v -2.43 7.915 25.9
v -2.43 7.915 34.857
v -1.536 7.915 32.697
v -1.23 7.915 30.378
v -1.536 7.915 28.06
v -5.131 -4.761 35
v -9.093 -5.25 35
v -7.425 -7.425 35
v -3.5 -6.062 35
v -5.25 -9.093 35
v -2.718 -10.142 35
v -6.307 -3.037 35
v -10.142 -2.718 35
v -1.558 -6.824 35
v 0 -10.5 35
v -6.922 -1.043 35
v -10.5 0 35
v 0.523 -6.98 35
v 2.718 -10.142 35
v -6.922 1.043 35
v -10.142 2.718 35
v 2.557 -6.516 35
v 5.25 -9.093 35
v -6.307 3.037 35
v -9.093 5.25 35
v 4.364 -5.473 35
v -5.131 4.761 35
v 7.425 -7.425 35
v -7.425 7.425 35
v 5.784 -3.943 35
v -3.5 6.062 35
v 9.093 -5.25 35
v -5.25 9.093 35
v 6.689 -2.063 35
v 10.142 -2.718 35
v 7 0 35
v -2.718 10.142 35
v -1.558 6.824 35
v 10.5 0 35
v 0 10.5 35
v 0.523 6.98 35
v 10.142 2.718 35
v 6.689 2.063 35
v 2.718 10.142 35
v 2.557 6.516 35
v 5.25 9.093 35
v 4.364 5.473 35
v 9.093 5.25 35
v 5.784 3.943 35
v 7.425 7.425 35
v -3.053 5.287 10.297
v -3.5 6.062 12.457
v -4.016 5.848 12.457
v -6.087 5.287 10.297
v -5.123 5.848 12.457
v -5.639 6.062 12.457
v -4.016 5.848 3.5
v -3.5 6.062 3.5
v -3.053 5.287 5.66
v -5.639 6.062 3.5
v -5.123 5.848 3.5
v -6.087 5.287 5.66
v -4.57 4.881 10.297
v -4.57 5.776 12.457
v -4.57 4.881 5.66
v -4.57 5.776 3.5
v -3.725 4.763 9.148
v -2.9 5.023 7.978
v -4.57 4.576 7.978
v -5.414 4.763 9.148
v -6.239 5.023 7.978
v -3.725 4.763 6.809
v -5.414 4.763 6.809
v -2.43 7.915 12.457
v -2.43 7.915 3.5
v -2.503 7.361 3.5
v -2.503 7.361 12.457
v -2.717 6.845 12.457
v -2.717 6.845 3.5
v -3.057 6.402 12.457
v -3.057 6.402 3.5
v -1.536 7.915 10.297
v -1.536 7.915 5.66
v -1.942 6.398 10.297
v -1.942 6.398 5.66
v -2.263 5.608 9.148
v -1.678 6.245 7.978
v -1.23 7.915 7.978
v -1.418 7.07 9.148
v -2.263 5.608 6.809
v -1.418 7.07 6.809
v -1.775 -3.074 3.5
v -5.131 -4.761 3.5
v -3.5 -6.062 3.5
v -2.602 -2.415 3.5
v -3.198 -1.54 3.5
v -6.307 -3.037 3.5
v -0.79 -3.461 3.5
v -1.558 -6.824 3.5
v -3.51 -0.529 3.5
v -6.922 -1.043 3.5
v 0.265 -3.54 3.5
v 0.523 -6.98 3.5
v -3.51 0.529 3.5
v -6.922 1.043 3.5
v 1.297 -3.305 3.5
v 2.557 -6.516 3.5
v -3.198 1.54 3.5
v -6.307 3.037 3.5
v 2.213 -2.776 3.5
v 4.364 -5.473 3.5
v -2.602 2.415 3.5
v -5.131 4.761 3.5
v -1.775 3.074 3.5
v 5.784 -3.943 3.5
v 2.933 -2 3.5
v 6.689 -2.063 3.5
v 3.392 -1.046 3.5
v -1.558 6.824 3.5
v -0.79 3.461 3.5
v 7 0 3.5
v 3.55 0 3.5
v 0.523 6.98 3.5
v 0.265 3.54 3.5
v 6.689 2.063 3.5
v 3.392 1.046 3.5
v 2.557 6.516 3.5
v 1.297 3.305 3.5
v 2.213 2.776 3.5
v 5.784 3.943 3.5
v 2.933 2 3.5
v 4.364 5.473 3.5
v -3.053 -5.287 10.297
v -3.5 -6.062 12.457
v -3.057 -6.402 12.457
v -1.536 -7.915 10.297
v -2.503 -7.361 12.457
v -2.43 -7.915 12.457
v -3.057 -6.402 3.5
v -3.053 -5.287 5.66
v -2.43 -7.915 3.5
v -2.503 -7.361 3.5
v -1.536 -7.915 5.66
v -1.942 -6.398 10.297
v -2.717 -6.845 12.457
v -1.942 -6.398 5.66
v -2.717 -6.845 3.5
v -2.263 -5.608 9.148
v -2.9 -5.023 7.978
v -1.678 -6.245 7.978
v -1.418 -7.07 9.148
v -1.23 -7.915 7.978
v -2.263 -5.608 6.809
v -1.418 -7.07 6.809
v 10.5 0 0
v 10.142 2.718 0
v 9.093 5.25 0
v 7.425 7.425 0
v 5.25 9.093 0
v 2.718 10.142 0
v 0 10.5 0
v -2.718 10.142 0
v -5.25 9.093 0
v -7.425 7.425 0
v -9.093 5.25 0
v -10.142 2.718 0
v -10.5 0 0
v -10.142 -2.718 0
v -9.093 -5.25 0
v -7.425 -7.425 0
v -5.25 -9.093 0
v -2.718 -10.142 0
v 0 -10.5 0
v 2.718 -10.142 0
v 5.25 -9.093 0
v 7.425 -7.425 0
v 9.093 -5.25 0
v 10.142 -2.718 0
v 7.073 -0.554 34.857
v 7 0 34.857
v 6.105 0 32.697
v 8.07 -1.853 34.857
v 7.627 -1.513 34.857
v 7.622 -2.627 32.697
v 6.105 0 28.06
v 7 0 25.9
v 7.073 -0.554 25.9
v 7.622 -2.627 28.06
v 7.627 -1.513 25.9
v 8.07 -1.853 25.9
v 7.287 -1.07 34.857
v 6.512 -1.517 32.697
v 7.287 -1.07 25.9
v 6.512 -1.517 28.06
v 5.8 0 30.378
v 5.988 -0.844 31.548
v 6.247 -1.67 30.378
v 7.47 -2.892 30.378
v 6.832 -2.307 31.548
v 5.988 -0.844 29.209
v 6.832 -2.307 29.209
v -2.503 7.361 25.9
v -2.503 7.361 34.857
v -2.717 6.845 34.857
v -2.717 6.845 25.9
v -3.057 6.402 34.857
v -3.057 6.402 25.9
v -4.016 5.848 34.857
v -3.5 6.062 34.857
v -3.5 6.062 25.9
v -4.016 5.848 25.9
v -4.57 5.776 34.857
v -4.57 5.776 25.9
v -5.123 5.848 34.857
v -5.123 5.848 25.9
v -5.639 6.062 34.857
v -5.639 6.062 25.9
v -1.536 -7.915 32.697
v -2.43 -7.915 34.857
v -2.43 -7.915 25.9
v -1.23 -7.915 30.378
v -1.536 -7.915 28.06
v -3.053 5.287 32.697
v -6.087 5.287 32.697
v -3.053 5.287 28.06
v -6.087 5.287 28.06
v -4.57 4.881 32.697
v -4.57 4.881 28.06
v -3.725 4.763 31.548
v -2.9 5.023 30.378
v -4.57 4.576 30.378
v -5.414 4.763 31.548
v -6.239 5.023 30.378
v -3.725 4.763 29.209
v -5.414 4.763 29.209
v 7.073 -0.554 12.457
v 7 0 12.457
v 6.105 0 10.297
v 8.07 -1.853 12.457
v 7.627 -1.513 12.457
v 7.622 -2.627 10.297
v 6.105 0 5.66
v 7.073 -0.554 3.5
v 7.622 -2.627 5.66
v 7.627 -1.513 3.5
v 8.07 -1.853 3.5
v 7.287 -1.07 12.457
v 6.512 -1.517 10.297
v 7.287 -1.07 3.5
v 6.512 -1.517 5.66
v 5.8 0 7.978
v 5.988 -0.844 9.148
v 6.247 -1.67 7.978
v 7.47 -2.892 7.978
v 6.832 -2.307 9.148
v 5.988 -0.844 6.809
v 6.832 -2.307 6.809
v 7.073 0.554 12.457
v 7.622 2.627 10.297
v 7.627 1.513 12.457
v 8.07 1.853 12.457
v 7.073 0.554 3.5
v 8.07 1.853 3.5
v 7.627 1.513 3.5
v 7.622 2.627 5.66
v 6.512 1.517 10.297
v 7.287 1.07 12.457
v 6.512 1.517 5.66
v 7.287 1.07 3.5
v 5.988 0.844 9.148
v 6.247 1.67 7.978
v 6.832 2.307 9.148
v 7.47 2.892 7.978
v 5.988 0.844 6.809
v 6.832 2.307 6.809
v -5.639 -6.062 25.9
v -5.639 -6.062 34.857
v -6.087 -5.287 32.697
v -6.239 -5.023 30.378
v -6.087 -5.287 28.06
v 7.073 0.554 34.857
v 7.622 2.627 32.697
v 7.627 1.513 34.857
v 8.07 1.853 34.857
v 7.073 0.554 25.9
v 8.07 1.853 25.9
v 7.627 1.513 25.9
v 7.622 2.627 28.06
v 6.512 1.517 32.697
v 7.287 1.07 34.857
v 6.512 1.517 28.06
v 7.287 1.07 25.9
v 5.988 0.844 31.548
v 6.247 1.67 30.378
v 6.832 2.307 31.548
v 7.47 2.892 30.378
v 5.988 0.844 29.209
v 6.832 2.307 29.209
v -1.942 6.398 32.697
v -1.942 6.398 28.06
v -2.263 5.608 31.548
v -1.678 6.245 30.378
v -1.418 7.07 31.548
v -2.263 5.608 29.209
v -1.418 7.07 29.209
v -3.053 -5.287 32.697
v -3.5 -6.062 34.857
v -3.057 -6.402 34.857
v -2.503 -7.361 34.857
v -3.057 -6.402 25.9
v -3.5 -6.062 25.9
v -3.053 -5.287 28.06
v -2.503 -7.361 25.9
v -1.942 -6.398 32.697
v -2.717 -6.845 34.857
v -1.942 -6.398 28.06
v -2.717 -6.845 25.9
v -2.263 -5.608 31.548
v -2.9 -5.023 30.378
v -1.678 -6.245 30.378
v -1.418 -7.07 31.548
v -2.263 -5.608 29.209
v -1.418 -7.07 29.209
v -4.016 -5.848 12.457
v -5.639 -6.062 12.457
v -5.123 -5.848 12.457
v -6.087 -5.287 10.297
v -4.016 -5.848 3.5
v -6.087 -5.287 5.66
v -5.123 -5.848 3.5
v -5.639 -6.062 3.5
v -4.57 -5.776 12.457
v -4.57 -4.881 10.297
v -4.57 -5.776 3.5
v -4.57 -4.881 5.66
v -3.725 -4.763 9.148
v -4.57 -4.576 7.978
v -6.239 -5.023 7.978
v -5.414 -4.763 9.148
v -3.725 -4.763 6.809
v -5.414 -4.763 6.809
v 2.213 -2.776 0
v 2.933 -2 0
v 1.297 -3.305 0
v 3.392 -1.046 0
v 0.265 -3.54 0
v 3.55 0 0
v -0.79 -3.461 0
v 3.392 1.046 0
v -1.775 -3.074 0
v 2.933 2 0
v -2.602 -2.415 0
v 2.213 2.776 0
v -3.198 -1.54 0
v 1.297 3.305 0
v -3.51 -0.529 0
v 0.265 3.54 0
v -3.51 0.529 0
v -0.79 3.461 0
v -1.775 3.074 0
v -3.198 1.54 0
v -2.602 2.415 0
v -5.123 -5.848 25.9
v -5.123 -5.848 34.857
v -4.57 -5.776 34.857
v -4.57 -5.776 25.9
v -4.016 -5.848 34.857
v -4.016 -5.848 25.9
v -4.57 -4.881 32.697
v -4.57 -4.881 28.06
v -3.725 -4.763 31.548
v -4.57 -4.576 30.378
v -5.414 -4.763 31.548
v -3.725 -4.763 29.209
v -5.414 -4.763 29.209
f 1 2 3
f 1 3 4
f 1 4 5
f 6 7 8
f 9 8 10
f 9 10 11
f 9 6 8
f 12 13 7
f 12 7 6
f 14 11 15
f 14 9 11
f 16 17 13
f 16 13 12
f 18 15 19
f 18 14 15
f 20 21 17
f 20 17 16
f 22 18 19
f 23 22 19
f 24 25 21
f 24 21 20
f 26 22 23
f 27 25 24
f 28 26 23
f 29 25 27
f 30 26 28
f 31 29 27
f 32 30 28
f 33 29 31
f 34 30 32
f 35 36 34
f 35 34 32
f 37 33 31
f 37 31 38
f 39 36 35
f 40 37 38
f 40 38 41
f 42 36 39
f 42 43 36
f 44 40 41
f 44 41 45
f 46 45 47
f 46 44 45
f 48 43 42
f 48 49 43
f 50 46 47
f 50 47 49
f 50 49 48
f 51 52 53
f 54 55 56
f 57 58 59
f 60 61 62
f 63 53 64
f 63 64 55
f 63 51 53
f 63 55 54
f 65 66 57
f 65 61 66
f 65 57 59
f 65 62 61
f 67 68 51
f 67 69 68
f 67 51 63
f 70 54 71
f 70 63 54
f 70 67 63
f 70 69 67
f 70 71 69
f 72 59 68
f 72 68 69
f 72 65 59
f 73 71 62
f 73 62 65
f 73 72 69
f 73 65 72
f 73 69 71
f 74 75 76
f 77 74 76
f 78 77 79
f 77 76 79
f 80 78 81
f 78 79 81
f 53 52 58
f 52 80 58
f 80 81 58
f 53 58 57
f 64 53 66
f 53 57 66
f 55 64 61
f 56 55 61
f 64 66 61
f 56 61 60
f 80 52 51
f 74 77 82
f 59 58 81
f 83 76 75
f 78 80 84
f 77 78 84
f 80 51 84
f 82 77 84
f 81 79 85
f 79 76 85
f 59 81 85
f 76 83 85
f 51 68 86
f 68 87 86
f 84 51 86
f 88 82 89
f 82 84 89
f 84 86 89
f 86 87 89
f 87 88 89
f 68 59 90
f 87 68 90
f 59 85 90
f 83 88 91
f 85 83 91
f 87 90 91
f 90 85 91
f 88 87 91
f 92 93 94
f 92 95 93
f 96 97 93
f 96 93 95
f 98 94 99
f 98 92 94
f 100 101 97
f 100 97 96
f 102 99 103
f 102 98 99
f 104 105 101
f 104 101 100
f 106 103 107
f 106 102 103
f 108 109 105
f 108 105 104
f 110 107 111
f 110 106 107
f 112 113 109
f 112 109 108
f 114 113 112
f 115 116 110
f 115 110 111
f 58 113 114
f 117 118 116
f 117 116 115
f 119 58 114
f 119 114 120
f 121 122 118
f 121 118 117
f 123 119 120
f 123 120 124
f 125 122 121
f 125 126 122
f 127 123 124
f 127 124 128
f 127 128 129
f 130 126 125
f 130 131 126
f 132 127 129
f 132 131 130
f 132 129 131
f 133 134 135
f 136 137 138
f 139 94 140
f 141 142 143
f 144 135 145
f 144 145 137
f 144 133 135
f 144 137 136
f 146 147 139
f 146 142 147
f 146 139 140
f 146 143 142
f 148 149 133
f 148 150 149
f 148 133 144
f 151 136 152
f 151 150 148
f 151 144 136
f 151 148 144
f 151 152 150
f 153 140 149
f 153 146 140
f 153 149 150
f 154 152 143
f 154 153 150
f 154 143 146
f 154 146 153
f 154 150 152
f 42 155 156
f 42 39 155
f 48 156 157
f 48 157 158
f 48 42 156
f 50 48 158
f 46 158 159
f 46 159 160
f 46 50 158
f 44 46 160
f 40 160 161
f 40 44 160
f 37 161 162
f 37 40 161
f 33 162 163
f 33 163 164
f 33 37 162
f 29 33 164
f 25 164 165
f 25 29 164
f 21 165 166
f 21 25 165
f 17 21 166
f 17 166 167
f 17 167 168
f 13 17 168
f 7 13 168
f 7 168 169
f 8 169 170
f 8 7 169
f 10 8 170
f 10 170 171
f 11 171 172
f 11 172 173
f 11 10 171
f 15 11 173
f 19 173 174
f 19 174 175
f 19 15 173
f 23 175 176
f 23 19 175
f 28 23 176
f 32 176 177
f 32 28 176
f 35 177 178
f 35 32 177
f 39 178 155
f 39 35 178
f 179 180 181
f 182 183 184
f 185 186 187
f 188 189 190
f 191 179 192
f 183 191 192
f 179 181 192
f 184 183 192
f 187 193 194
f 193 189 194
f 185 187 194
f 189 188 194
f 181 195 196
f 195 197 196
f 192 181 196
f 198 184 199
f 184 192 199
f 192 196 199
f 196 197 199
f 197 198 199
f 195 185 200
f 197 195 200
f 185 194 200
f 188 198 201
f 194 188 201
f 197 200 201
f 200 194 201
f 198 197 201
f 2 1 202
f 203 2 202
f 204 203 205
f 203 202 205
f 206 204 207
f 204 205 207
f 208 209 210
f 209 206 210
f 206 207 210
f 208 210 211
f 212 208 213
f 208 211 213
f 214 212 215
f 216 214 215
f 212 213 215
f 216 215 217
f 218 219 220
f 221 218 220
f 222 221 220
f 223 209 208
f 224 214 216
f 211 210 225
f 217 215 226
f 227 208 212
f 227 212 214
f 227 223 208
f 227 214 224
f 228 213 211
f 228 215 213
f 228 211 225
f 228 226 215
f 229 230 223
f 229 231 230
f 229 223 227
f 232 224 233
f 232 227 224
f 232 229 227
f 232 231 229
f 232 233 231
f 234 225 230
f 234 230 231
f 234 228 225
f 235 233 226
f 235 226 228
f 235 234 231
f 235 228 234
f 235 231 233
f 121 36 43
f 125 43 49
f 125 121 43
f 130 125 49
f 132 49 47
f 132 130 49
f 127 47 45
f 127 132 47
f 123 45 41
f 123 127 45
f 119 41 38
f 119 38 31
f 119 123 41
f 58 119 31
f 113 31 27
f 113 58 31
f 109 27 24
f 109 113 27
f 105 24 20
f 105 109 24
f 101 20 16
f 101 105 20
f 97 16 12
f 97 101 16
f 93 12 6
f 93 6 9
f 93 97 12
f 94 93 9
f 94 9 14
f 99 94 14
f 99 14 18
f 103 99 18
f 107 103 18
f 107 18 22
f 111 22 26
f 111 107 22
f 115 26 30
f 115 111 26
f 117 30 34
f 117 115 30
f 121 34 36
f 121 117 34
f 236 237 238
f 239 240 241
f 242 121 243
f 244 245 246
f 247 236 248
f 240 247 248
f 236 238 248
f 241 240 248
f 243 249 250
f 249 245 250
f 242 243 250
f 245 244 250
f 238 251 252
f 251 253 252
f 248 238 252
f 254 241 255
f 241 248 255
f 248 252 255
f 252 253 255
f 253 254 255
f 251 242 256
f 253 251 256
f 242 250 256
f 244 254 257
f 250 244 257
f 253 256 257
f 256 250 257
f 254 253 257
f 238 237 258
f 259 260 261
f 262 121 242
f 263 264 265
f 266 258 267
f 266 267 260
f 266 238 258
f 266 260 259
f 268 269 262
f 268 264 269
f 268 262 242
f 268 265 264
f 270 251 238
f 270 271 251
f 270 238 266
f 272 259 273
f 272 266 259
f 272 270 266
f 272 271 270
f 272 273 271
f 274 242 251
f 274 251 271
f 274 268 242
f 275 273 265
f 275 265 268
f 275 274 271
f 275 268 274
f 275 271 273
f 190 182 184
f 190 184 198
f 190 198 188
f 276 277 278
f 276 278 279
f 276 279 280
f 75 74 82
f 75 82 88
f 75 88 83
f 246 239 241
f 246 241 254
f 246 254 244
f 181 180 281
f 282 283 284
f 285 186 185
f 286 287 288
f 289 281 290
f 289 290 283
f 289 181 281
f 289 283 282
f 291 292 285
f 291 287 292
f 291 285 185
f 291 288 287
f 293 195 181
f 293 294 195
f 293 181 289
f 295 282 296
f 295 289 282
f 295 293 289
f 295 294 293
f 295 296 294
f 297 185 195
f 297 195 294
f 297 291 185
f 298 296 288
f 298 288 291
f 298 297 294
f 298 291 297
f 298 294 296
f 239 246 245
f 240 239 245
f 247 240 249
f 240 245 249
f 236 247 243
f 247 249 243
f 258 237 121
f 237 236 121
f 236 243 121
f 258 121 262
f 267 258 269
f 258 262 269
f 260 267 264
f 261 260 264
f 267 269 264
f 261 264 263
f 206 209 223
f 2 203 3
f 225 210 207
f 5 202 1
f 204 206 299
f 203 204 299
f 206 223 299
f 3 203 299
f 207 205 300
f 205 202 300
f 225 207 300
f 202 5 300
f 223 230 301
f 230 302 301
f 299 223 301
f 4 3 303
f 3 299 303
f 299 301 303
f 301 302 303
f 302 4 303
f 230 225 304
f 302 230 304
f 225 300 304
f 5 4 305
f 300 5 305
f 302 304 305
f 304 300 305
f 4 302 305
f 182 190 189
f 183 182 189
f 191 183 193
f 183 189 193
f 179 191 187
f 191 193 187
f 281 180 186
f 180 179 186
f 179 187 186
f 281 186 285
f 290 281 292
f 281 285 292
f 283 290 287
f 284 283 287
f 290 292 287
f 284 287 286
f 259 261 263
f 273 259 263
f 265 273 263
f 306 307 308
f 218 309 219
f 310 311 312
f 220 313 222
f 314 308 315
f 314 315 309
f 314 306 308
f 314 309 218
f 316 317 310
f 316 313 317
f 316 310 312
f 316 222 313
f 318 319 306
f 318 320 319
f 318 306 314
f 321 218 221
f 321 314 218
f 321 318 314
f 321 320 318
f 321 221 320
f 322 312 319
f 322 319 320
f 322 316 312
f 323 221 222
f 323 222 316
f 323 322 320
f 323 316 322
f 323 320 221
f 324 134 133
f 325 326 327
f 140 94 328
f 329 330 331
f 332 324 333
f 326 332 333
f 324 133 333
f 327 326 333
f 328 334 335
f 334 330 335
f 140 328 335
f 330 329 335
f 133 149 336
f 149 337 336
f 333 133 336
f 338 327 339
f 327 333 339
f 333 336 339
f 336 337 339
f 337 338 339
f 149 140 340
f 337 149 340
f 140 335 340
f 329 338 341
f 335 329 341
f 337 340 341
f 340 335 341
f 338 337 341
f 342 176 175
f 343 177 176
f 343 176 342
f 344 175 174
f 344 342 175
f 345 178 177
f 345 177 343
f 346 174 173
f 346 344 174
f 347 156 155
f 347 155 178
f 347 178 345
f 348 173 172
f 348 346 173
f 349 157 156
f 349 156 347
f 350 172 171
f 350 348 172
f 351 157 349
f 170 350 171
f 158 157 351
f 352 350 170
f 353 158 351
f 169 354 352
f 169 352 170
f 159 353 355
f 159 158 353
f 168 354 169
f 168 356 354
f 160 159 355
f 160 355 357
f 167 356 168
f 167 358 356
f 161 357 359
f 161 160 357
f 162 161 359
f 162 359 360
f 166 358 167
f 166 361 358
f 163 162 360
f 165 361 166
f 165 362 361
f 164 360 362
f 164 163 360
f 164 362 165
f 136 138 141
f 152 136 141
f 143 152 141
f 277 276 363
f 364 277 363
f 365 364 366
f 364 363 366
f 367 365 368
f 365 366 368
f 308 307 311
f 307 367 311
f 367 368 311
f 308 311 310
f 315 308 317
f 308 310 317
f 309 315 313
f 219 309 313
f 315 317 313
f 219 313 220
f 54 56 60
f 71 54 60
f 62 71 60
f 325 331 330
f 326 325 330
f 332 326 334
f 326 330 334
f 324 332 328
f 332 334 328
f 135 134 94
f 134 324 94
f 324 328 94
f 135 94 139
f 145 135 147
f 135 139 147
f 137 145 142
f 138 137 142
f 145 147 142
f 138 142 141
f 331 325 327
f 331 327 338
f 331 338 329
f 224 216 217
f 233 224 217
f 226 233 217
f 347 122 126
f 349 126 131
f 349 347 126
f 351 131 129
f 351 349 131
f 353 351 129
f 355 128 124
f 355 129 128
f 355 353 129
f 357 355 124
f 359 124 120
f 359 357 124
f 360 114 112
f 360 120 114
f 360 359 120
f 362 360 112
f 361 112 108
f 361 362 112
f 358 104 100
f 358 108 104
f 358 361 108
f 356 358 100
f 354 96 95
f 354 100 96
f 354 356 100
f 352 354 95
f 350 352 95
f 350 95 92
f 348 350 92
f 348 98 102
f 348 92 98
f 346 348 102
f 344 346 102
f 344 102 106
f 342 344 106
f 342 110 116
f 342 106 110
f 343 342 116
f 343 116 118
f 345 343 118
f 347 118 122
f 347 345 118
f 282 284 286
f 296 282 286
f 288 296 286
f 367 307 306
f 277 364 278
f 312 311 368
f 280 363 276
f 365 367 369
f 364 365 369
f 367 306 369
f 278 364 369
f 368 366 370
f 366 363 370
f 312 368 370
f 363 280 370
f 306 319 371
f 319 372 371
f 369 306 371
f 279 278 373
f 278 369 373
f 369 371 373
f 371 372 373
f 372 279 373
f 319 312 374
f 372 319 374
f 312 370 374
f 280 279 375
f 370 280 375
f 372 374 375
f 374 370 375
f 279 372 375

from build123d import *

# Parameters (mm, degrees)
SKETCH004_R             = 3.55
HOLE_DEPTH              = 35.001
REVOLUTION001_ANGLE     = 120
REVOLUTION002_ANGLE     = 120
BODY002_PLACEMENT_ANGLE = 120
REVOLUTION003_ANGLE     = 120
BODY003_PLACEMENT_ANGLE = 240
REVOLUTION004_ANGLE     = 120
REVOLUTION005_ANGLE     = 120
BODY005_PLACEMENT_ANGLE = 120
REVOLUTION006_ANGLE     = 120
BODY006_PLACEMENT_ANGLE = 240


with BuildPart() as sleeve:
    # Sketch → Revolution (revolve)
    with BuildSketch(Plane.XZ):
        Polygon((0, 0), (10.5, 0), (10.5, 35), (7, 35), (7, 3.5), (0, 3.5), align=None)
    revolve(axis=Axis((0, 0, 0), (0, 0, 1)))

    # Sketch004 → Hole (cut, through all)
    with BuildSketch(Plane.XY):
        Circle(SKETCH004_R)
    extrude(amount=HOLE_DEPTH, mode=Mode.SUBTRACT)


with BuildPart() as body001:
    # Sketch003 → Revolution001 (revolve, symmetric)
    with BuildSketch(Plane.XZ) as revolution001_sk:
        with BuildLine():
            ThreePointArc((7, 12.456922), (5.8, 7.978461), (7, 3.5))
            Line((7, 12.456922), (7, 3.5))
        make_face()
    revolve(axis=Axis((9.13913, 0, 0), (0, 0, 1)), revolution_arc=REVOLUTION001_ANGLE / 2)
    revolve(revolution001_sk.sketch, axis=Axis((9.13913, 0, 0), (0, 0, -1)), revolution_arc=REVOLUTION001_ANGLE / 2)


with BuildPart() as body002:
    # Sketch003 → Revolution002 (revolve, symmetric)
    with BuildSketch(Plane.XZ) as revolution002_sk:
        with BuildLine():
            ThreePointArc((7, 12.456922), (5.8, 7.978461), (7, 3.5))
            Line((7, 12.456922), (7, 3.5))
        make_face()
    revolve(axis=Axis((9.13913, 0, 0), (0, 0, 1)), revolution_arc=REVOLUTION002_ANGLE / 2)
    revolve(revolution002_sk.sketch, axis=Axis((9.13913, 0, 0), (0, 0, -1)), revolution_arc=REVOLUTION002_ANGLE / 2)


with BuildPart() as body002_1:
    # Body002 placement: moved
    add(body002.part.rotate(Axis((0, 0, 0), (0, 0, 1)), BODY002_PLACEMENT_ANGLE))


with BuildPart() as body003:
    # Sketch003 → Revolution003 (revolve, symmetric)
    with BuildSketch(Plane.XZ) as revolution003_sk:
        with BuildLine():
            ThreePointArc((7, 12.456922), (5.8, 7.978461), (7, 3.5))
            Line((7, 12.456922), (7, 3.5))
        make_face()
    revolve(axis=Axis((9.13913, 0, 0), (0, 0, 1)), revolution_arc=REVOLUTION003_ANGLE / 2)
    revolve(revolution003_sk.sketch, axis=Axis((9.13913, 0, 0), (0, 0, -1)), revolution_arc=REVOLUTION003_ANGLE / 2)


with BuildPart() as body003_1:
    # Body003 placement: moved
    add(body003.part.rotate(Axis((0, 0, 0), (0, 0, 1)), BODY003_PLACEMENT_ANGLE))


with BuildPart() as body004:
    # Sketch003 → Revolution004 (revolve, symmetric)
    with BuildSketch(Plane.XZ) as revolution004_sk:
        with BuildLine():
            ThreePointArc((7, 12.456922), (5.8, 7.978461), (7, 3.5))
            Line((7, 12.456922), (7, 3.5))
        make_face()
    revolve(axis=Axis((9.13913, 0, 0), (0, 0, 1)), revolution_arc=REVOLUTION004_ANGLE / 2)
    revolve(revolution004_sk.sketch, axis=Axis((9.13913, 0, 0), (0, 0, -1)), revolution_arc=REVOLUTION004_ANGLE / 2)


with BuildPart() as body004_1:
    # Body004 placement: moved
    add(body004.part.moved(Location((0, 0, 22.4))))


with BuildPart() as body005:
    # Sketch003 → Revolution005 (revolve, symmetric)
    with BuildSketch(Plane.XZ) as revolution005_sk:
        with BuildLine():
            ThreePointArc((7, 12.456922), (5.8, 7.978461), (7, 3.5))
            Line((7, 12.456922), (7, 3.5))
        make_face()
    revolve(axis=Axis((9.13913, 0, 0), (0, 0, 1)), revolution_arc=REVOLUTION005_ANGLE / 2)
    revolve(revolution005_sk.sketch, axis=Axis((9.13913, 0, 0), (0, 0, -1)), revolution_arc=REVOLUTION005_ANGLE / 2)


with BuildPart() as body005_1:
    # Body005 placement: moved
    add(body005.part.moved(Location((0, 0, 22.4))).rotate(Axis((0, 0, 22.4), (0, 0, 1)), BODY005_PLACEMENT_ANGLE))


with BuildPart() as body006:
    # Sketch003 → Revolution006 (revolve, symmetric)
    with BuildSketch(Plane.XZ) as revolution006_sk:
        with BuildLine():
            ThreePointArc((7, 12.456922), (5.8, 7.978461), (7, 3.5))
            Line((7, 12.456922), (7, 3.5))
        make_face()
    revolve(axis=Axis((9.13913, 0, 0), (0, 0, 1)), revolution_arc=REVOLUTION006_ANGLE / 2)
    revolve(revolution006_sk.sketch, axis=Axis((9.13913, 0, 0), (0, 0, -1)), revolution_arc=REVOLUTION006_ANGLE / 2)


with BuildPart() as body006_1:
    # Body006 placement: moved
    add(body006.part.moved(Location((0, 0, 22.4))).rotate(Axis((0, 0, 22.4), (0, 0, 1)), BODY006_PLACEMENT_ANGLE))


solid = Compound([sleeve.part, body001.part, body002_1.part, body003_1.part, body004_1.part, body005_1.part, body006_1.part])
